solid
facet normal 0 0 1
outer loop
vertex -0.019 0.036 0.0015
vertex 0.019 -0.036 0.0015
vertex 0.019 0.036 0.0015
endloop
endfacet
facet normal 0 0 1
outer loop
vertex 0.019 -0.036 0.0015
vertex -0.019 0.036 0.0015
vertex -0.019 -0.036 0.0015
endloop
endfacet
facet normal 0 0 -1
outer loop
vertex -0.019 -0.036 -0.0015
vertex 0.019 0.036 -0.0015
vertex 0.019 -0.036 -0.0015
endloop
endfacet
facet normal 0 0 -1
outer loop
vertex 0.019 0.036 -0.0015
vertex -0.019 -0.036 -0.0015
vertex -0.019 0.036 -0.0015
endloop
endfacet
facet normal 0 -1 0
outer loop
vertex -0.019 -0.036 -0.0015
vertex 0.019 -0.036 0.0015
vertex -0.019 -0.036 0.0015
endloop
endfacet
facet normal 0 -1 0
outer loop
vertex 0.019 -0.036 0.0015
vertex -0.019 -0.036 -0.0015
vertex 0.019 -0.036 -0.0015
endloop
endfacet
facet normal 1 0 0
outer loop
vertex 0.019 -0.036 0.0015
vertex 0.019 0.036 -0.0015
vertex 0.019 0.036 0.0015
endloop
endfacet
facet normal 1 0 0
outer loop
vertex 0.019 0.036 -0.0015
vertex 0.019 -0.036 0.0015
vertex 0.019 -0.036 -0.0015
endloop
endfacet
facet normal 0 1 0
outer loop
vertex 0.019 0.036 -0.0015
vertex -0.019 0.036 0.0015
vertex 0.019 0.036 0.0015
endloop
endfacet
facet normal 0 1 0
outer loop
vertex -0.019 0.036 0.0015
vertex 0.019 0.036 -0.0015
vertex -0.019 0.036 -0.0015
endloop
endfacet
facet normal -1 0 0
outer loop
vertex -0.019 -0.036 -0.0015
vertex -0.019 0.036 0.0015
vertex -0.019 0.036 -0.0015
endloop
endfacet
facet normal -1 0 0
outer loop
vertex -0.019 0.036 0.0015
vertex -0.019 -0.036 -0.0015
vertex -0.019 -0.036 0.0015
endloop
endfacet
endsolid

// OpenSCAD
// Oneirifact graph source-first OpenSCAD emission (R96)
// source revision: sha256:18051a3ea5a011a58ed0947d369db7b563ecb8d950a76e202c049b0ab5e68a36
// SCAD units: meters, Z-up; $fn is tessellation only
module of_f0() {
  cube([0.38, 0.71999999999999997, 0.029999999999999999], center=true);
}
module of_f1() {
  scale([0.10000000000000001, 0.10000000000000001, 0.10000000000000001]) of_f0();
}
of_f1();
